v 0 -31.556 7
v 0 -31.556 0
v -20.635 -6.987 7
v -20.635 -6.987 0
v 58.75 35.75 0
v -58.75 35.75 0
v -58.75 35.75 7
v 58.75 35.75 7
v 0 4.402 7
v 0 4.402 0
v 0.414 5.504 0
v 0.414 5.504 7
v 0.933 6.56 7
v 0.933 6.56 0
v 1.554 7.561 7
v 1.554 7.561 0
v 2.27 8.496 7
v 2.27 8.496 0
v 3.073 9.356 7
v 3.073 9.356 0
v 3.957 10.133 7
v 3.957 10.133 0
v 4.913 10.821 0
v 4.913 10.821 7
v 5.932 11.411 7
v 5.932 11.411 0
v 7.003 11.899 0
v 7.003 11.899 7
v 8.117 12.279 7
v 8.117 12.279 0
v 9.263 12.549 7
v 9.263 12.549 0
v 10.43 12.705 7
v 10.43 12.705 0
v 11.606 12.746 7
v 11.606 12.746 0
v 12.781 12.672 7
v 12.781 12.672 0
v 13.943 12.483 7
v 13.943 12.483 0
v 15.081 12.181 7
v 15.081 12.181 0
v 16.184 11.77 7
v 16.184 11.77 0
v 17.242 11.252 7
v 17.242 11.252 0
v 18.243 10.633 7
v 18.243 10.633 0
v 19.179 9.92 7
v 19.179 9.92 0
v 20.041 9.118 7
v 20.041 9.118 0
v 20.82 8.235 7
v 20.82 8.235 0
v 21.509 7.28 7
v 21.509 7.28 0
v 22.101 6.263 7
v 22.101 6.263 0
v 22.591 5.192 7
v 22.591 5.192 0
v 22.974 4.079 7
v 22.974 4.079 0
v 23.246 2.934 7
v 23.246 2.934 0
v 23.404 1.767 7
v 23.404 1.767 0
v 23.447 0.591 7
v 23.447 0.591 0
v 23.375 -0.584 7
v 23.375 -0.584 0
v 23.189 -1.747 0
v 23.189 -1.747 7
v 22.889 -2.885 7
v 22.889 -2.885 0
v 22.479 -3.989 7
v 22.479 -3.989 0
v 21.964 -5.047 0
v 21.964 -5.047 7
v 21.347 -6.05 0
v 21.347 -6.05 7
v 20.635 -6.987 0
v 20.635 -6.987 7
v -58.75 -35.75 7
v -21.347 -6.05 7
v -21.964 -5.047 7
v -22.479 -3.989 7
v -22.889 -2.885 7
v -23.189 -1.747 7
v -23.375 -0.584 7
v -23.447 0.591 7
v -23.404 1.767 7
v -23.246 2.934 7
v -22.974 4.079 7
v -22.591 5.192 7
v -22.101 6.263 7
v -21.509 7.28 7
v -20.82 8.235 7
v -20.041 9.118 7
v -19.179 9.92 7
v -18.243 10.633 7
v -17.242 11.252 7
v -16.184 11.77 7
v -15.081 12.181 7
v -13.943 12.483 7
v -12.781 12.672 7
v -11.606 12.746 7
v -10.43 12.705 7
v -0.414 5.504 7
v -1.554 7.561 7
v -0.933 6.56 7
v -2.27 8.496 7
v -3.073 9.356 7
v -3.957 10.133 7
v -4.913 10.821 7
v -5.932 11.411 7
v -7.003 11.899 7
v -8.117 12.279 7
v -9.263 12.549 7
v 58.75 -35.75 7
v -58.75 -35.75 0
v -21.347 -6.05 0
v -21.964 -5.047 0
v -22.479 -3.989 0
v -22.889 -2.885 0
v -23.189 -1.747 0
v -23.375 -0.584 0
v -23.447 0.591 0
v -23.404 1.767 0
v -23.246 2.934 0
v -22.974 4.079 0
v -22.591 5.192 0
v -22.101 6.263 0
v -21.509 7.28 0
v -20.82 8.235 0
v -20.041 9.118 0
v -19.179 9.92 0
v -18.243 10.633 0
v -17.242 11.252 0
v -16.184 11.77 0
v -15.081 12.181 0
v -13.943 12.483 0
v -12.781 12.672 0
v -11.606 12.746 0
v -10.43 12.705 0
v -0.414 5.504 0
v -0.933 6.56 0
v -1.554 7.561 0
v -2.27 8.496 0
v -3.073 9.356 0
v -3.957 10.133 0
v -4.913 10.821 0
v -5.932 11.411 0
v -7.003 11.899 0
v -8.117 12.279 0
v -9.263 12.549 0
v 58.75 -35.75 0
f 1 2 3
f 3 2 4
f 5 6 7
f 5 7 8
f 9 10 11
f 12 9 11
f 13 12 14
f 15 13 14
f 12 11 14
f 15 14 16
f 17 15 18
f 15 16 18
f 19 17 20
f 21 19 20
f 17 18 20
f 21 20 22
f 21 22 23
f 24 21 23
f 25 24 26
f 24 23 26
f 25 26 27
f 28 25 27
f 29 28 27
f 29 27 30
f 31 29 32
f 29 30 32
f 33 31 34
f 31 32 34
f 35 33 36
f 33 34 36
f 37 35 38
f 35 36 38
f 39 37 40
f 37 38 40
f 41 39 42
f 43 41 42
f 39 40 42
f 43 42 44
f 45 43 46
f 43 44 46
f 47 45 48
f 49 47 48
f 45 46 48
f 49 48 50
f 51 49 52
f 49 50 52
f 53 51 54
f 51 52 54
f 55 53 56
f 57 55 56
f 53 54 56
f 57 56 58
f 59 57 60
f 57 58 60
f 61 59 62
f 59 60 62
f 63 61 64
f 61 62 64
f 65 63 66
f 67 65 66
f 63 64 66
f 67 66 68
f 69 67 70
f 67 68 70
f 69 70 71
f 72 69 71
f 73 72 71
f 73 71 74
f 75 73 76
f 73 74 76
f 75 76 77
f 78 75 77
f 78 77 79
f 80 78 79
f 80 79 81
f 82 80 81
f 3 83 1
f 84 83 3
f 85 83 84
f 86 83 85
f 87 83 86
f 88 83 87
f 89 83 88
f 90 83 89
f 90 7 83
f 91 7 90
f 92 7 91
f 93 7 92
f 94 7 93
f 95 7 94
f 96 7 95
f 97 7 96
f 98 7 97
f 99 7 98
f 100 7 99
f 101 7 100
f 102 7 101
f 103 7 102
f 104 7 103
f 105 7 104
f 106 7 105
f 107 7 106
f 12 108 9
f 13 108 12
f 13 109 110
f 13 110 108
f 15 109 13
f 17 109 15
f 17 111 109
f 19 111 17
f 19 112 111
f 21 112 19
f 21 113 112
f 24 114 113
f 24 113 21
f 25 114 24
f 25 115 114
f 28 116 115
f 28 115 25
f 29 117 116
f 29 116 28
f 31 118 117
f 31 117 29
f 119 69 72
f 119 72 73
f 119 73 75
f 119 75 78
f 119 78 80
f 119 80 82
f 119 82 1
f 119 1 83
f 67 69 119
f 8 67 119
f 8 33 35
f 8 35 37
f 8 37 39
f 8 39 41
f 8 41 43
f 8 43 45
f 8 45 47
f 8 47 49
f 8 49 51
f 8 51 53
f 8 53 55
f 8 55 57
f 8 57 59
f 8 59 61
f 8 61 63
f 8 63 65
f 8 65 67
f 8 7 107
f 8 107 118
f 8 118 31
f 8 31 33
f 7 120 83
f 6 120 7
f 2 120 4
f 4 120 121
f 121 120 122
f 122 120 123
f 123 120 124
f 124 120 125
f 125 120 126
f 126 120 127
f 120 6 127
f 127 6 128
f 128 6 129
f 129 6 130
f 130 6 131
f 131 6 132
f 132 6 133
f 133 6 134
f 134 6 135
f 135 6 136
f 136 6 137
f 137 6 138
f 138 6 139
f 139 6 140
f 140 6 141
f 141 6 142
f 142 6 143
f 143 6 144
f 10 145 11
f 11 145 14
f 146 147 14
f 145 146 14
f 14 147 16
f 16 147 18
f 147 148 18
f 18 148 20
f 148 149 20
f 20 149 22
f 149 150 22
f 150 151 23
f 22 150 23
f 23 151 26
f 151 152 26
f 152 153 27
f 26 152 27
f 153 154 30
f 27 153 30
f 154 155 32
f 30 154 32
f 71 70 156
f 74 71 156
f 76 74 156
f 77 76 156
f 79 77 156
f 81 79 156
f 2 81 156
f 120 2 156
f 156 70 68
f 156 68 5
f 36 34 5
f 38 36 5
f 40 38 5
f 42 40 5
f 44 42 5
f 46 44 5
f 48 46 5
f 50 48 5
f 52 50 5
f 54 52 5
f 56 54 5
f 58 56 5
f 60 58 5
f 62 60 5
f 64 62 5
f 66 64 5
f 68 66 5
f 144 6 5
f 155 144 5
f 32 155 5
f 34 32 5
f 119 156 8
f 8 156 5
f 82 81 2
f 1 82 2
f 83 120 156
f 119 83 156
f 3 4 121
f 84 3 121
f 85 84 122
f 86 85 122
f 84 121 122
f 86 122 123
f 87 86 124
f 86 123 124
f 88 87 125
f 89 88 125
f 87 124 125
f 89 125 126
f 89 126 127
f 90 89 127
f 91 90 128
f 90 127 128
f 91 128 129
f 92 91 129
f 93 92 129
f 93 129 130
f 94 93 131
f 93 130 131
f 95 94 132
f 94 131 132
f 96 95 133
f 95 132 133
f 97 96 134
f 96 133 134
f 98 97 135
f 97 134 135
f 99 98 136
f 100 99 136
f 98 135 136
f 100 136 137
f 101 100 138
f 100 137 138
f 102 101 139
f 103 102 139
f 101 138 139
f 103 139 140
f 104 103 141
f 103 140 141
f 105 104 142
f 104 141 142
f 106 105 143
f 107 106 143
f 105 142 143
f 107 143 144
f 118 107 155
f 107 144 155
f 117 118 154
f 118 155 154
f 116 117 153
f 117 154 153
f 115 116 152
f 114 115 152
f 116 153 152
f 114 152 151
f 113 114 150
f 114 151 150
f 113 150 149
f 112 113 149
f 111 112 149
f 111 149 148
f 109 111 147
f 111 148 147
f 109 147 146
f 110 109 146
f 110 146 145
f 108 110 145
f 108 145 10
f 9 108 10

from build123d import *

# Parameters (mm, degrees)
F0_W     = 117.5
F0_H     = 71.5
F1_DEPTH = 7


with BuildPart() as f1:
    # F0 (on Top) → F1 (new body)
    with BuildSketch(Plane.XY):
        Rectangle(F0_W, F0_H)
        with BuildLine():
            Line((20.634694, -6.987499), (0, -31.555828))
            Line((0, -31.555828), (-20.634694, -6.987499))
            ThreePointArc((-20.634694, -6.987499), (-17.241509, 11.252086), (0, 4.401793))
            ThreePointArc((0, 4.401793), (17.241509, 11.252086), (20.634694, -6.987499))
        make_face(mode=Mode.SUBTRACT)
    extrude(amount=F1_DEPTH)


solid = f1.part
